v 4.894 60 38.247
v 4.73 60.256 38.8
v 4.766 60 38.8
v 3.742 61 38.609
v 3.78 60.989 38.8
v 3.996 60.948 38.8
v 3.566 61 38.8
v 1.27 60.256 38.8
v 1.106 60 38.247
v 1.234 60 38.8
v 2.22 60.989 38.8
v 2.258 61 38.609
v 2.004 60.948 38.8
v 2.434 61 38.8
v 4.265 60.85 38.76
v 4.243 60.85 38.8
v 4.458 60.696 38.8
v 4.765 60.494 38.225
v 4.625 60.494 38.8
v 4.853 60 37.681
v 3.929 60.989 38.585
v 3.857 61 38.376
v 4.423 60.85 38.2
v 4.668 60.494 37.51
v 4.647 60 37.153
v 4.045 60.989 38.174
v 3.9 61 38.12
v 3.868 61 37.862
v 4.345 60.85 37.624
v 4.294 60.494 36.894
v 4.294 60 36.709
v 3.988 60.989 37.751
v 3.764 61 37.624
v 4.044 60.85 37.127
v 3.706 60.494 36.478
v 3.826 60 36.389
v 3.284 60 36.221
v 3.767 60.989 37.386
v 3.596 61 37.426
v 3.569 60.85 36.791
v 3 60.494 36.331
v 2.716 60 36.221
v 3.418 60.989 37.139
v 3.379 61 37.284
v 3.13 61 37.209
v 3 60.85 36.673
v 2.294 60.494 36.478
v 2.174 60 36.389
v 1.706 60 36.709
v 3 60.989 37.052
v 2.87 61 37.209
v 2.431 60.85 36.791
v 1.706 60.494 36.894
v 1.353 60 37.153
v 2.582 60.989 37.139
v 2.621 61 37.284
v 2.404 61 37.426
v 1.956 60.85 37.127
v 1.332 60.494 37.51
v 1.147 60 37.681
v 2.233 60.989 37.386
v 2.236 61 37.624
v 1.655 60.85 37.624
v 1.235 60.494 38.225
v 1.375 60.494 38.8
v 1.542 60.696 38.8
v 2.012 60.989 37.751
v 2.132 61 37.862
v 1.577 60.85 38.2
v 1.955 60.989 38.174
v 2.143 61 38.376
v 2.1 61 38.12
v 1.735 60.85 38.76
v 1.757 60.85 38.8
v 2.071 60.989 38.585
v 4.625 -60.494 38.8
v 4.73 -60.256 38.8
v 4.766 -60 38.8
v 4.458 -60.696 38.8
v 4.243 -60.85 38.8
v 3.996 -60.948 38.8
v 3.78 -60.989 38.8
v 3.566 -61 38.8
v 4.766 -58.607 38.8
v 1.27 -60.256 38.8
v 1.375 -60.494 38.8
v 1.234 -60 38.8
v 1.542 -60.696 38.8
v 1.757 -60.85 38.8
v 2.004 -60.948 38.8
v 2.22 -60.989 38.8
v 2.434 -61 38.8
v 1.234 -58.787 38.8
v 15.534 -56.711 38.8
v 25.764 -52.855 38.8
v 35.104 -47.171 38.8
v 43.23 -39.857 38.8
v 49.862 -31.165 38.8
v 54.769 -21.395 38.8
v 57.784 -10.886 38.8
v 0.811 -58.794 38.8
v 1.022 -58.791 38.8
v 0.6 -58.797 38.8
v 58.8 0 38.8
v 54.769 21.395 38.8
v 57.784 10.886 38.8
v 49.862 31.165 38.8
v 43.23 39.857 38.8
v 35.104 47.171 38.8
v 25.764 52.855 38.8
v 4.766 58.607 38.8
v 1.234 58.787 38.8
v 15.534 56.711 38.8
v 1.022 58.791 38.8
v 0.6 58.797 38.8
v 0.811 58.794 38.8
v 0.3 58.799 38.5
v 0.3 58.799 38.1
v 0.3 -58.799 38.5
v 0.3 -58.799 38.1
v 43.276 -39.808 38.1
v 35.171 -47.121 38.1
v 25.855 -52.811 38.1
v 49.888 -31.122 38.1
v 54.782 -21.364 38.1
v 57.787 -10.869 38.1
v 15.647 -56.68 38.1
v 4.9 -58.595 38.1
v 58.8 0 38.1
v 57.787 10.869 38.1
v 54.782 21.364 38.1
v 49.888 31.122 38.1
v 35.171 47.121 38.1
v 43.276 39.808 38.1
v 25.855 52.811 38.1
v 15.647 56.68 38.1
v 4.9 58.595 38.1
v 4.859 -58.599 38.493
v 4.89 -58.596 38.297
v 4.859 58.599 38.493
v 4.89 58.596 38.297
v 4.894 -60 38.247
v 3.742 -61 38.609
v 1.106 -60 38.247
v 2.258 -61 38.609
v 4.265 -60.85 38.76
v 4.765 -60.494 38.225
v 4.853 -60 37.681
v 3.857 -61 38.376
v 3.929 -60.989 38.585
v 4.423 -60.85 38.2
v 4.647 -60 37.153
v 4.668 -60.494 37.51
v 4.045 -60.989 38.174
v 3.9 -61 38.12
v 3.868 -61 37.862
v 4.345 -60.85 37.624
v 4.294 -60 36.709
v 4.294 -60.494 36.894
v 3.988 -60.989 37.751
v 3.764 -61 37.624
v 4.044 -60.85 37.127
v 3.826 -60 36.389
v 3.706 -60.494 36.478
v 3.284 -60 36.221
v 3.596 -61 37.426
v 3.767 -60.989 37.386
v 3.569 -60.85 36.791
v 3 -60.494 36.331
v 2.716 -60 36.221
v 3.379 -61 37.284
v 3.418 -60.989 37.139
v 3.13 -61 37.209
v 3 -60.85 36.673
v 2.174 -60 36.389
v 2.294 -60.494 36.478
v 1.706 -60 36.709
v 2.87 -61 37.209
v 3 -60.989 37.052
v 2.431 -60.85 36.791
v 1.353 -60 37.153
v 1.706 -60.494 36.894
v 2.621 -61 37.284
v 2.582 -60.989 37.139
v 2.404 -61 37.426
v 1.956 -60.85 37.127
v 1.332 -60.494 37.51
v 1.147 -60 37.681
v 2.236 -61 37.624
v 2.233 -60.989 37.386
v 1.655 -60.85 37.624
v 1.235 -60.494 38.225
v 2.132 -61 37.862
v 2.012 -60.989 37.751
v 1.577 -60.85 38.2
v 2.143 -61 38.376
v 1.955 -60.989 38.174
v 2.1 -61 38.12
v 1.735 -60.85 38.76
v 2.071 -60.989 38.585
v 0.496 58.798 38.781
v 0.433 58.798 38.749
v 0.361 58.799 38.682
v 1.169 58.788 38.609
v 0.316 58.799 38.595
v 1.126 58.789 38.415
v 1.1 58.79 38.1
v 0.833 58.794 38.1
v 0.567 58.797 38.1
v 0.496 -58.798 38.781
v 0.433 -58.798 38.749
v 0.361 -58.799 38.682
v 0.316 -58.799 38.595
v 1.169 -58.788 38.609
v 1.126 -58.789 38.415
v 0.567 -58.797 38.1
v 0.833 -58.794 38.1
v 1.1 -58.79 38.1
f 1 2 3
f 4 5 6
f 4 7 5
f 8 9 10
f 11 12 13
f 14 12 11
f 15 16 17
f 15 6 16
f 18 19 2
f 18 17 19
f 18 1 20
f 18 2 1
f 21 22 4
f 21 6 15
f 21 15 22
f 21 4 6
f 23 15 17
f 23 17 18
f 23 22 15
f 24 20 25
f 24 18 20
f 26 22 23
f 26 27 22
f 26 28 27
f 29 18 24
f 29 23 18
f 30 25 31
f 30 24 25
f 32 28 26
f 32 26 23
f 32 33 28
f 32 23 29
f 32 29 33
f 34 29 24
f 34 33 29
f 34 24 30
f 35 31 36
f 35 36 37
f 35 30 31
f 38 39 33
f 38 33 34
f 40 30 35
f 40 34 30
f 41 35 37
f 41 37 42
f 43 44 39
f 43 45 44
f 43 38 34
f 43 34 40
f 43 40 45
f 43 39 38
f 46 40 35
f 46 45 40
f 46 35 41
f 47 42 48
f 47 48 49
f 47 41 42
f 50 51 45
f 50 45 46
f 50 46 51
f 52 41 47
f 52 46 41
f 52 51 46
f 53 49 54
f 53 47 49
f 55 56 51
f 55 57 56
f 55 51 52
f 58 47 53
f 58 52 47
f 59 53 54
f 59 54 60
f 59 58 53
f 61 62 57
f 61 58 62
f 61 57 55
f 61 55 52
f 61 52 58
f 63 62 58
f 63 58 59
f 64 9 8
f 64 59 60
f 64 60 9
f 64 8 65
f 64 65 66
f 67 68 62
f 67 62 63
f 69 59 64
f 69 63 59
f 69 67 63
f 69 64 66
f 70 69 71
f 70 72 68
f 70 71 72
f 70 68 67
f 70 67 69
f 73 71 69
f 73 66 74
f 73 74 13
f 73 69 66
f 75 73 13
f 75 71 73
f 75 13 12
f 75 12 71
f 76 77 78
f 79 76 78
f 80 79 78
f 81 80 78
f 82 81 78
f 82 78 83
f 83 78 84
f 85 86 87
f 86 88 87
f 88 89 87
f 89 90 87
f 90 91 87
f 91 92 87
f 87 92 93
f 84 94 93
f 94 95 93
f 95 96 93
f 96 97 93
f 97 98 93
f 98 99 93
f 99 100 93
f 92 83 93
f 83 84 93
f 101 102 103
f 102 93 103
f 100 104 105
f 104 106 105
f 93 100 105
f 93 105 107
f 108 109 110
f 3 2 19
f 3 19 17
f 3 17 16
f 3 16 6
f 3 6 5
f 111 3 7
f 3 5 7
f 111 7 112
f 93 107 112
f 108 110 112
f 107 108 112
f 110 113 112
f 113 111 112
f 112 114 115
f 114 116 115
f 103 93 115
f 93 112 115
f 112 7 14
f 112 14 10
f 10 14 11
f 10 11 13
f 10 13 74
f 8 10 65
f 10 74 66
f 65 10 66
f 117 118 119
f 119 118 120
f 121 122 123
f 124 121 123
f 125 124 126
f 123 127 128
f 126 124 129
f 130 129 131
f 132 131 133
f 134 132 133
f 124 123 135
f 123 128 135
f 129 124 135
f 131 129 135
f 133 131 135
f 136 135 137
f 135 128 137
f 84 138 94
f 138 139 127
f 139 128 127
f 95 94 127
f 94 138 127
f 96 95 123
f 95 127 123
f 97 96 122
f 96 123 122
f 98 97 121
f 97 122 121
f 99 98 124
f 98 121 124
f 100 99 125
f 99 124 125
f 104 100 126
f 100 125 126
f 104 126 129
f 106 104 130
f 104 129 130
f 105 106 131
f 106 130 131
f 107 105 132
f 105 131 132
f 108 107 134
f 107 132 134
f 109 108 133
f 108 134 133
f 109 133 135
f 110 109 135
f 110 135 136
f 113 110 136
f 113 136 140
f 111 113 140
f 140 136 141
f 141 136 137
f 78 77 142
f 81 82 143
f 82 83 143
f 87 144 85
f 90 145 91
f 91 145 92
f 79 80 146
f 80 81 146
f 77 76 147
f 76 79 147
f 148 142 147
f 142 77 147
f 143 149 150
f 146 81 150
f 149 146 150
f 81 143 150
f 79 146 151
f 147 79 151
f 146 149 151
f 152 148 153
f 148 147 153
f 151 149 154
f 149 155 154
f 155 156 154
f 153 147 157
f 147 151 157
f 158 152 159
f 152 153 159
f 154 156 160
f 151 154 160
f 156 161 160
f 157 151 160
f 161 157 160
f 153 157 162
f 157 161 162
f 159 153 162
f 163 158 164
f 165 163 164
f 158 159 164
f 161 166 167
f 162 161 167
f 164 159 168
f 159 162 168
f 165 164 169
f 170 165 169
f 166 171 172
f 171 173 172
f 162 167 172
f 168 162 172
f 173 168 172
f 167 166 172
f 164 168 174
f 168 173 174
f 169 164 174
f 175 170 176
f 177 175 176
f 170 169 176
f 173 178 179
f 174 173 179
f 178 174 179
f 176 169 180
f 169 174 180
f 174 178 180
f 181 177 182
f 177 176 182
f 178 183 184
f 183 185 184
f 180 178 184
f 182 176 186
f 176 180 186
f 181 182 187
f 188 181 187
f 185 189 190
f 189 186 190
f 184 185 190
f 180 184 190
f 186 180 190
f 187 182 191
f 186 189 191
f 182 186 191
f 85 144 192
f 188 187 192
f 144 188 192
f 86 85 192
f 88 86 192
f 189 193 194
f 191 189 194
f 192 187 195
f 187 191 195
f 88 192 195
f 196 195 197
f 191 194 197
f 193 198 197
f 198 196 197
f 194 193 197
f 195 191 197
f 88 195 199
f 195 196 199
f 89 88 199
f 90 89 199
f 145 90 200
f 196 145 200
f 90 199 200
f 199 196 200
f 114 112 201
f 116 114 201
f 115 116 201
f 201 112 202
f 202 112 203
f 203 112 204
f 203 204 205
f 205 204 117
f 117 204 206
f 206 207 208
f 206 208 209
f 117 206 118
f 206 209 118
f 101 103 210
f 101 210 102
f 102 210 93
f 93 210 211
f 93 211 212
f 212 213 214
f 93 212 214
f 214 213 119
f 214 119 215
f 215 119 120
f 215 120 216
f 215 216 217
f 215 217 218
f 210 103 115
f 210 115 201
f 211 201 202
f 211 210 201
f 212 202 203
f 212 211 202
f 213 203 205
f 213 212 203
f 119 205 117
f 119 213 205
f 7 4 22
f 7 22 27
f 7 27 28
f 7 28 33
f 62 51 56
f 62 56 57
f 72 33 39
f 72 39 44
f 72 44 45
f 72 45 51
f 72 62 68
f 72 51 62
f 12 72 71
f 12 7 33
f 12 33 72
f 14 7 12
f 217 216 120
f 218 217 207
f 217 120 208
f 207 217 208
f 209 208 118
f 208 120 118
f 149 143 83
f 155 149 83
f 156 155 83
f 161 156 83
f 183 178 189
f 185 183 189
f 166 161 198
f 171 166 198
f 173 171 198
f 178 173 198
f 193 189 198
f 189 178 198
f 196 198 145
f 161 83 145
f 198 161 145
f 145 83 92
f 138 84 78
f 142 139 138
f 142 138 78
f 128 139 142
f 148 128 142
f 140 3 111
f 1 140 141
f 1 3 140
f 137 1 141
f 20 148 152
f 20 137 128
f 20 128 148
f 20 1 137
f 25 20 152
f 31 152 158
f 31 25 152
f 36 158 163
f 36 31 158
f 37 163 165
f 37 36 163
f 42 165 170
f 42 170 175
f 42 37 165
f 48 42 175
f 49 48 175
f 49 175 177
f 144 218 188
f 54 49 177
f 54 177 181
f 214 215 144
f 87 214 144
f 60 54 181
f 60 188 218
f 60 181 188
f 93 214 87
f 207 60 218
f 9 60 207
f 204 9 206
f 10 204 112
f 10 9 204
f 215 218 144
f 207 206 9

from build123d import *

# Parameters (mm, degrees)
PAD_DEPTH    = 0.7
PAD001_DEPTH = 61
FILLET_R     = 1
FILLET001_R  = 0.3


with BuildPart() as part:
    # Sketch004 (on DatumPlane) → Pad (new body)
    with BuildSketch(Plane(origin=(0, 0, 38.1), x_dir=(0, 1, 0), z_dir=(0, 0, 1))):
        with BuildLine():
            ThreePointArc((-58.799235, -0.3), (0, -58.8), (58.799235, -0.3))
            Line((58.799235, -0.3), (-58.799235, -0.3))
        make_face()
    extrude(amount=PAD_DEPTH)

    # Sketch005 (on DatumPlane) → Pad001 (join, symmetric)
    with BuildSketch(Plane(origin=(0, 0, 0), x_dir=(-1, 0, 0), z_dir=(0, 1, 0))):
        with BuildLine():
            ThreePointArc((-4.766352, 38.8), (-3, 36.2), (-1.233648, 38.8))
            Line((-4.766352, 38.8), (-1.233648, 38.8))
        make_face()
    extrude(amount=PAD001_DEPTH, both=True)

    # Fillet
    fillet_edges = [part.edges().sort_by_distance(p)[0] for p in [
        (3, -61, 36.2),
        (3, 61, 36.2),
    ]]
    fillet(fillet_edges, radius=FILLET_R)

    # Fillet001
    fillet001_edges = [part.edges().sort_by_distance(p)[0] for p in [
        (0.3, 0, 38.8),
    ]]
    fillet(fillet001_edges, radius=FILLET001_R)


solid = part.part
